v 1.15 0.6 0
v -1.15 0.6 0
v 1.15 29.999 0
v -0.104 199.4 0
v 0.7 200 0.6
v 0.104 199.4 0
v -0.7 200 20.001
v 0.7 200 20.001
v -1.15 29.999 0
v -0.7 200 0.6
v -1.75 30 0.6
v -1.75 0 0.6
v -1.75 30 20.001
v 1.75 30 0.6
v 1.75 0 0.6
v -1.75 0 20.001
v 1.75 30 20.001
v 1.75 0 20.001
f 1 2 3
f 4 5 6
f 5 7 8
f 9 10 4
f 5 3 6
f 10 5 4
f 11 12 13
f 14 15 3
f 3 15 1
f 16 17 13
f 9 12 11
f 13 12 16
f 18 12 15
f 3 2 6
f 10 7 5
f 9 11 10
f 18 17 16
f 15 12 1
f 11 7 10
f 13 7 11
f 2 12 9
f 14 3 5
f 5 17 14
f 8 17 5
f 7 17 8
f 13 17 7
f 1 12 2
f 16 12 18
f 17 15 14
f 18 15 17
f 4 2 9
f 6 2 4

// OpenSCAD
// file: common.scad
$fa = 5;
$fs = 0.1;
eps = 0.001;

// Use a larger value for faster rendering.
$zstep = 0.4;

// An inward chamfer sufficient to prevent elephant's foot.
foot = 0.4;

// FINDINGS FROM CLEARANCE TEST
//
// Consider a vertical hole of width X, a layer height of 0.2, and a vertical
// post.
//   * A post of diameter X will not fit in.
//   * A post of diameter X-0.1 will fit in, but is very hard to slide in or out.
//     This is probably due mostly to the transverse grain of the print.
//     It will rotate, but with some resistance.
//   * A post of diameter X-0.2 slides in and out easily. It rotates easily, but
//     still has noticeable resistance at some points.
//   * A post of diameter X-0.3 rotates freely. It also has noticeable play
//     from side to side.
//
// Clearances are expressed as the total across both sides of a joint.
tight = 0.1;  // Intended for stationary joints.
snug = 0.2;   // Moves, but with some resistance.
loose = 0.3;  // Free movement.

// A brim is a 0.2mm layer printed near an edge which is likely to warp.
// The edge should be chamfered outwards at 45 degrees. The brim should
// be placed this far from the bottom of the edge, so it barely touches
// the chamfer.
brim_offset = 0.3;

// Menards 5/8 x 2-3/4 x 0.04 WG compression spring.
spring_od = 5/8 * 25.4;
// Subtract 10 from the relaxed length so everything is slightly tensioned
// all the time.
spring_max_length = 2.75 * 25.4 - 10;
spring_min_length = 16;  // Approximate.

// Menards 1/4 inch aluminum rod.
roller_diameter = 6.7;

// 550 paracord.
string_diameter = 3;

module octagon(diameter) {
  intersection_for(a = [0, 45])
    rotate([0, 0, a])
      square(diameter, center=true);
}

// A cylinder with a chamfered or flared bottom end, useful for dealing
// with elephant's foot on pins or holes.
module flare_cylinder(height, radius, flare) {
  translate([0, 0, abs(flare)-eps])
    cylinder(height-abs(flare)+eps, radius, radius);

  linear_extrude(abs(flare), scale=radius/(radius-flare))
    circle(radius-flare);
}

// A cube with a chamfered or flared bottom end, useful for dealing
// with elephant's foot on pins or holes.
module flare_cube(dims, flare) {
  translate([0, 0, abs(flare)-eps])
    cube([dims.x, dims.y, dims.z - abs(flare) + eps]);

  translate([dims.x/2, dims.y/2, 0])
    linear_extrude(abs(flare), scale=[dims.x/(dims.x-2*flare), dims.y/(dims.y-2*flare)])
      translate([-(dims.x-2*flare)/2, -(dims.y-2*flare)/2, abs(flare)-eps])
        square([dims.x-2*flare, dims.y-2*flare]);
}

// An approximate circle which can be printed on its side.
module circle_ish(r) {
  // Safe overhang angle.
  q = 45;
  
  intersection() {
    // Add 0.2 (one print layer) in case the bridge is messy and hangs
    // down.
    square(2*r+0.2, center=true);
    hull() {
      circle(r);
      for (a = [-1, 1])
        translate([0, a*r/cos(q), 0])
          square(eps, center=true);
    }
  }
}
// main file
include <common.scad>

// Extra foot, since we will print with a brim.
brim_foot = 0.6;

module profile(height) {
  hull() {
    // Chamfered bottom.
    linear_extrude(eps)
      offset(delta=-brim_foot)
        children();
    
    // Main body.
    translate([0, 0, brim_foot])
      linear_extrude(eps)
        children();
    translate([0, 0, height])
      linear_extrude(eps)
        children();
  }
}

base_thickness = 3.5;
tip_thickness = 1.4;
base_length = 30;
total_length = 200;
width = 20;

profile(width)
  hull()
    for (a = [-1, 1])
      scale([a, 1, 1])
        polygon([
          [0, 0],
          [base_thickness/2, 0],
          [base_thickness/2, base_length],
          [tip_thickness/2, total_length],
        ]);
